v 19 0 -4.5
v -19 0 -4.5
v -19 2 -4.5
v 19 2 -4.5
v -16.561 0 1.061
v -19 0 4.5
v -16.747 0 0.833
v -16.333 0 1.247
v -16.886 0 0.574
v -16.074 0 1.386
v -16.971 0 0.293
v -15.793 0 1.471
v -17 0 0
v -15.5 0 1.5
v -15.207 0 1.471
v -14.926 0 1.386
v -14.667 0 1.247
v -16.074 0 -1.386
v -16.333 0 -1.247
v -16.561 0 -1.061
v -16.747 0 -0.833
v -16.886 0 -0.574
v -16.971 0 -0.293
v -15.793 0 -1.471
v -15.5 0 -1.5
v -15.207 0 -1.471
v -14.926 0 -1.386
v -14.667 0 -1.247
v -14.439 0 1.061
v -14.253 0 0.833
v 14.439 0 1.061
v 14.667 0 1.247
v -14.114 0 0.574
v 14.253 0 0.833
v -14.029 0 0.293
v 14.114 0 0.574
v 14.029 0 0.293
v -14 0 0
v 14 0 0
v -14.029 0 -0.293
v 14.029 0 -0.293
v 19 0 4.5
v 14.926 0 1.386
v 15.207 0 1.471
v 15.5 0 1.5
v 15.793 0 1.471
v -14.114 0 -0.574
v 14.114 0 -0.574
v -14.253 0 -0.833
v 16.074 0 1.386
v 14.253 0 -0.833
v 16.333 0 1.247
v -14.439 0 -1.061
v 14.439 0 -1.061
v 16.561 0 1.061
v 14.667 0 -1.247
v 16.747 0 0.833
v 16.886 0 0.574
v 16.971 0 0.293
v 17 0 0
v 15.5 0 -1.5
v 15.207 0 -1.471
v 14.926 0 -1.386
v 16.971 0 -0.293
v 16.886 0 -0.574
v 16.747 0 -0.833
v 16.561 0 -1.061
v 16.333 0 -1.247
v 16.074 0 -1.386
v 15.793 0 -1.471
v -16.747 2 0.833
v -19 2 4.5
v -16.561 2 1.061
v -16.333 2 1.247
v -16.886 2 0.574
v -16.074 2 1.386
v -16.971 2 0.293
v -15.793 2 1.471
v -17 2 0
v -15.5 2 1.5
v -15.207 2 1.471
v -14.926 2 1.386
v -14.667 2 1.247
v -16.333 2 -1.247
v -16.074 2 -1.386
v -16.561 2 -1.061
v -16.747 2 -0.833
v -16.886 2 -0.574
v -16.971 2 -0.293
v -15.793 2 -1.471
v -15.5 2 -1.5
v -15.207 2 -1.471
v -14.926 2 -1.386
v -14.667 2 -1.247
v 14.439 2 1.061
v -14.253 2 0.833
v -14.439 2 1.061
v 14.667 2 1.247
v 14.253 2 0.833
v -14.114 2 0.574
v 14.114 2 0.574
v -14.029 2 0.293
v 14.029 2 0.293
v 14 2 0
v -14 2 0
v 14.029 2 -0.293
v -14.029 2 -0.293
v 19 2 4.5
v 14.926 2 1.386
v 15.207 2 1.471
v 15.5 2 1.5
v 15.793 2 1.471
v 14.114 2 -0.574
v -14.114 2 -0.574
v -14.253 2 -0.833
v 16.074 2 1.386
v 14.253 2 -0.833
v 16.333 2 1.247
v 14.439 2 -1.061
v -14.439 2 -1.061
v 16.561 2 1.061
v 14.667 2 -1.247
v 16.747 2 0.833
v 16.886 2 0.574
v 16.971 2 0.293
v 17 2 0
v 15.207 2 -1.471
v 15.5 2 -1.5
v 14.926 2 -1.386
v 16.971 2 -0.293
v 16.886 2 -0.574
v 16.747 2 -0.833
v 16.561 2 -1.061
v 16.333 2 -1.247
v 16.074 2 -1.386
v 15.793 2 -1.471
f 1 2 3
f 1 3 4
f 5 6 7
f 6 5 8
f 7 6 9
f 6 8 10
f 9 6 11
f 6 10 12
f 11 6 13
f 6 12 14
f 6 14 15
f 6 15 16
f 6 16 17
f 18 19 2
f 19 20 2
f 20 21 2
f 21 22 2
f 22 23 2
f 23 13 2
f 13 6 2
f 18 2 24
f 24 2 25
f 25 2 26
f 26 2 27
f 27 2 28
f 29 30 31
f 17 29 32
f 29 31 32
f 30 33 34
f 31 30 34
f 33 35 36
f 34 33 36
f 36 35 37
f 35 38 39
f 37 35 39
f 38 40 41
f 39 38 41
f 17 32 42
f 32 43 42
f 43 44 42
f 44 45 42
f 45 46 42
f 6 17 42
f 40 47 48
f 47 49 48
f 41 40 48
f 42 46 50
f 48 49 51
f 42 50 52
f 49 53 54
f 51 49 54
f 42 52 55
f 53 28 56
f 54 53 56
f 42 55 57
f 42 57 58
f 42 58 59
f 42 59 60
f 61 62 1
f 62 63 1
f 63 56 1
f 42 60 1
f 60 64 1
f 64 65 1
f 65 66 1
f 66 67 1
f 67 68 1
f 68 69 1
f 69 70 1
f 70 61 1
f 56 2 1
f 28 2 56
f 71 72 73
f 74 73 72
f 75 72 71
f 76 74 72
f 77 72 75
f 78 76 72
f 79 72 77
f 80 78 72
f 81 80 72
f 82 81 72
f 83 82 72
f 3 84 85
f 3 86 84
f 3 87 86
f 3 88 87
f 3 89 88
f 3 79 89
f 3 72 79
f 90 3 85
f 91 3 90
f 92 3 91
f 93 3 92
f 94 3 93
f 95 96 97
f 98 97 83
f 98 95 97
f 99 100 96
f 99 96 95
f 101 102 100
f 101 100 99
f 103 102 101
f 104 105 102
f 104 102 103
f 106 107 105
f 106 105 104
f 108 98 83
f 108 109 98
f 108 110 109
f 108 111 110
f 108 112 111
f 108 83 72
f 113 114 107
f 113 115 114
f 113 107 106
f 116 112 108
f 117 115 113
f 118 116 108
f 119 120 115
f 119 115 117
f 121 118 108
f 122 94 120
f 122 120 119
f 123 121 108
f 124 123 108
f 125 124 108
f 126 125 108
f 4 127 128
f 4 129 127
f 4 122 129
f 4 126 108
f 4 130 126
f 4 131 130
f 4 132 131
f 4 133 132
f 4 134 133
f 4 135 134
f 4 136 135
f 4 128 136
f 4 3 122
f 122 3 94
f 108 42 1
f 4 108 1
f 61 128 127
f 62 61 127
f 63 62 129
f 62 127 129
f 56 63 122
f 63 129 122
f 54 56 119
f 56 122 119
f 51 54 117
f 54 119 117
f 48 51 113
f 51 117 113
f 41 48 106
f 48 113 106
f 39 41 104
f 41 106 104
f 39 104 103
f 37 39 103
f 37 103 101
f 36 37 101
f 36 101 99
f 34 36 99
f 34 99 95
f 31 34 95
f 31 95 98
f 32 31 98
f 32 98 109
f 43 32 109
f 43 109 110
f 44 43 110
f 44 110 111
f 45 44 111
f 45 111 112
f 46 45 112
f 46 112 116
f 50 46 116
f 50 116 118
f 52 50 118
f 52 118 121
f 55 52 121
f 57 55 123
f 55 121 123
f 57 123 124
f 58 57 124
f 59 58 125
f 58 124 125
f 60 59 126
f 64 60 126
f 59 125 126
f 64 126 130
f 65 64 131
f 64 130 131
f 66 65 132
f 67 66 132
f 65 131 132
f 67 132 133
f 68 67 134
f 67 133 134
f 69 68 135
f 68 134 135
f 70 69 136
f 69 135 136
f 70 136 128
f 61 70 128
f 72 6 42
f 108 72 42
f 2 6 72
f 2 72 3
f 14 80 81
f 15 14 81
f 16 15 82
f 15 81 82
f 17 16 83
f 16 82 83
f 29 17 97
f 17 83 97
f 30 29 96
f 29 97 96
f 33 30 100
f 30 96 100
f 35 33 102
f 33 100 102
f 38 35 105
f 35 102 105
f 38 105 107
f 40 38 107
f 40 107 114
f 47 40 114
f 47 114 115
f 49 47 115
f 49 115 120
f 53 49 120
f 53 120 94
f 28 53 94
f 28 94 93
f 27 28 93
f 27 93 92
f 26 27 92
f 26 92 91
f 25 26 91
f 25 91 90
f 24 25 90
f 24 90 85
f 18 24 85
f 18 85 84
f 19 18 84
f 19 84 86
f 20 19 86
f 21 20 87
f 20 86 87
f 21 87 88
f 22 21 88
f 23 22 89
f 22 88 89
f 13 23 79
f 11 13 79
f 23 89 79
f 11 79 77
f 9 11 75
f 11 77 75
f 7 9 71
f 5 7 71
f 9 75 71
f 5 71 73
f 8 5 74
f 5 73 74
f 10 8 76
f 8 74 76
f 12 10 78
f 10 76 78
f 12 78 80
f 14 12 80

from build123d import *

# Parameters (mm, degrees)
CROQUIS1_W              = 38
CROQUIS1_H              = 9
SALIENTE_EXTRUIR1_DEPTH = 2
CORTAR_EXTRUIR1_REACH   = 21.628
CROQUIS2_R              = 1.5


with BuildPart() as part:
    # Croquis1 → Saliente-Extruir1 (new body)
    with BuildSketch(Plane(origin=(0, 0, 0), x_dir=(1, 0, 0), z_dir=(0, 1, 0))):
        Rectangle(CROQUIS1_W, CROQUIS1_H)
    extrude(amount=SALIENTE_EXTRUIR1_DEPTH)

    # Croquis2 → Cortar-Extruir1 (cut, up to next)
    with BuildSketch(Plane(origin=(0, 2, 0), x_dir=(1, 0, 0), z_dir=(0, 1, 0)), mode=Mode.PRIVATE) as cortar_extruir1_sk1:
        with Locations(Location((-15.5, 0, 0), (0, 0, 270))):
            Circle(CROQUIS2_R)
    cortar_extruir1_tool1 = extrude(cortar_extruir1_sk1.sketch, amount=-CORTAR_EXTRUIR1_REACH, mode=Mode.PRIVATE) & part.part
    # Croquis2 → Cortar-Extruir1 (cut, up to next)
    with BuildSketch(Plane(origin=(0, 2, 0), x_dir=(1, 0, 0), z_dir=(0, 1, 0)), mode=Mode.PRIVATE) as cortar_extruir1_sk2:
        with Locations(Location((15.5, 0, 0), (0, 0, 90))):
            Circle(CROQUIS2_R)
    cortar_extruir1_tool2 = extrude(cortar_extruir1_sk2.sketch, amount=-CORTAR_EXTRUIR1_REACH, mode=Mode.PRIVATE) & part.part
    add(cortar_extruir1_tool1.solids().sort_by_distance((-15.5, 2, 0))[0], mode=Mode.SUBTRACT)
    add(cortar_extruir1_tool2.solids().sort_by_distance((15.5, 2, 0))[0], mode=Mode.SUBTRACT)


solid = part.part
